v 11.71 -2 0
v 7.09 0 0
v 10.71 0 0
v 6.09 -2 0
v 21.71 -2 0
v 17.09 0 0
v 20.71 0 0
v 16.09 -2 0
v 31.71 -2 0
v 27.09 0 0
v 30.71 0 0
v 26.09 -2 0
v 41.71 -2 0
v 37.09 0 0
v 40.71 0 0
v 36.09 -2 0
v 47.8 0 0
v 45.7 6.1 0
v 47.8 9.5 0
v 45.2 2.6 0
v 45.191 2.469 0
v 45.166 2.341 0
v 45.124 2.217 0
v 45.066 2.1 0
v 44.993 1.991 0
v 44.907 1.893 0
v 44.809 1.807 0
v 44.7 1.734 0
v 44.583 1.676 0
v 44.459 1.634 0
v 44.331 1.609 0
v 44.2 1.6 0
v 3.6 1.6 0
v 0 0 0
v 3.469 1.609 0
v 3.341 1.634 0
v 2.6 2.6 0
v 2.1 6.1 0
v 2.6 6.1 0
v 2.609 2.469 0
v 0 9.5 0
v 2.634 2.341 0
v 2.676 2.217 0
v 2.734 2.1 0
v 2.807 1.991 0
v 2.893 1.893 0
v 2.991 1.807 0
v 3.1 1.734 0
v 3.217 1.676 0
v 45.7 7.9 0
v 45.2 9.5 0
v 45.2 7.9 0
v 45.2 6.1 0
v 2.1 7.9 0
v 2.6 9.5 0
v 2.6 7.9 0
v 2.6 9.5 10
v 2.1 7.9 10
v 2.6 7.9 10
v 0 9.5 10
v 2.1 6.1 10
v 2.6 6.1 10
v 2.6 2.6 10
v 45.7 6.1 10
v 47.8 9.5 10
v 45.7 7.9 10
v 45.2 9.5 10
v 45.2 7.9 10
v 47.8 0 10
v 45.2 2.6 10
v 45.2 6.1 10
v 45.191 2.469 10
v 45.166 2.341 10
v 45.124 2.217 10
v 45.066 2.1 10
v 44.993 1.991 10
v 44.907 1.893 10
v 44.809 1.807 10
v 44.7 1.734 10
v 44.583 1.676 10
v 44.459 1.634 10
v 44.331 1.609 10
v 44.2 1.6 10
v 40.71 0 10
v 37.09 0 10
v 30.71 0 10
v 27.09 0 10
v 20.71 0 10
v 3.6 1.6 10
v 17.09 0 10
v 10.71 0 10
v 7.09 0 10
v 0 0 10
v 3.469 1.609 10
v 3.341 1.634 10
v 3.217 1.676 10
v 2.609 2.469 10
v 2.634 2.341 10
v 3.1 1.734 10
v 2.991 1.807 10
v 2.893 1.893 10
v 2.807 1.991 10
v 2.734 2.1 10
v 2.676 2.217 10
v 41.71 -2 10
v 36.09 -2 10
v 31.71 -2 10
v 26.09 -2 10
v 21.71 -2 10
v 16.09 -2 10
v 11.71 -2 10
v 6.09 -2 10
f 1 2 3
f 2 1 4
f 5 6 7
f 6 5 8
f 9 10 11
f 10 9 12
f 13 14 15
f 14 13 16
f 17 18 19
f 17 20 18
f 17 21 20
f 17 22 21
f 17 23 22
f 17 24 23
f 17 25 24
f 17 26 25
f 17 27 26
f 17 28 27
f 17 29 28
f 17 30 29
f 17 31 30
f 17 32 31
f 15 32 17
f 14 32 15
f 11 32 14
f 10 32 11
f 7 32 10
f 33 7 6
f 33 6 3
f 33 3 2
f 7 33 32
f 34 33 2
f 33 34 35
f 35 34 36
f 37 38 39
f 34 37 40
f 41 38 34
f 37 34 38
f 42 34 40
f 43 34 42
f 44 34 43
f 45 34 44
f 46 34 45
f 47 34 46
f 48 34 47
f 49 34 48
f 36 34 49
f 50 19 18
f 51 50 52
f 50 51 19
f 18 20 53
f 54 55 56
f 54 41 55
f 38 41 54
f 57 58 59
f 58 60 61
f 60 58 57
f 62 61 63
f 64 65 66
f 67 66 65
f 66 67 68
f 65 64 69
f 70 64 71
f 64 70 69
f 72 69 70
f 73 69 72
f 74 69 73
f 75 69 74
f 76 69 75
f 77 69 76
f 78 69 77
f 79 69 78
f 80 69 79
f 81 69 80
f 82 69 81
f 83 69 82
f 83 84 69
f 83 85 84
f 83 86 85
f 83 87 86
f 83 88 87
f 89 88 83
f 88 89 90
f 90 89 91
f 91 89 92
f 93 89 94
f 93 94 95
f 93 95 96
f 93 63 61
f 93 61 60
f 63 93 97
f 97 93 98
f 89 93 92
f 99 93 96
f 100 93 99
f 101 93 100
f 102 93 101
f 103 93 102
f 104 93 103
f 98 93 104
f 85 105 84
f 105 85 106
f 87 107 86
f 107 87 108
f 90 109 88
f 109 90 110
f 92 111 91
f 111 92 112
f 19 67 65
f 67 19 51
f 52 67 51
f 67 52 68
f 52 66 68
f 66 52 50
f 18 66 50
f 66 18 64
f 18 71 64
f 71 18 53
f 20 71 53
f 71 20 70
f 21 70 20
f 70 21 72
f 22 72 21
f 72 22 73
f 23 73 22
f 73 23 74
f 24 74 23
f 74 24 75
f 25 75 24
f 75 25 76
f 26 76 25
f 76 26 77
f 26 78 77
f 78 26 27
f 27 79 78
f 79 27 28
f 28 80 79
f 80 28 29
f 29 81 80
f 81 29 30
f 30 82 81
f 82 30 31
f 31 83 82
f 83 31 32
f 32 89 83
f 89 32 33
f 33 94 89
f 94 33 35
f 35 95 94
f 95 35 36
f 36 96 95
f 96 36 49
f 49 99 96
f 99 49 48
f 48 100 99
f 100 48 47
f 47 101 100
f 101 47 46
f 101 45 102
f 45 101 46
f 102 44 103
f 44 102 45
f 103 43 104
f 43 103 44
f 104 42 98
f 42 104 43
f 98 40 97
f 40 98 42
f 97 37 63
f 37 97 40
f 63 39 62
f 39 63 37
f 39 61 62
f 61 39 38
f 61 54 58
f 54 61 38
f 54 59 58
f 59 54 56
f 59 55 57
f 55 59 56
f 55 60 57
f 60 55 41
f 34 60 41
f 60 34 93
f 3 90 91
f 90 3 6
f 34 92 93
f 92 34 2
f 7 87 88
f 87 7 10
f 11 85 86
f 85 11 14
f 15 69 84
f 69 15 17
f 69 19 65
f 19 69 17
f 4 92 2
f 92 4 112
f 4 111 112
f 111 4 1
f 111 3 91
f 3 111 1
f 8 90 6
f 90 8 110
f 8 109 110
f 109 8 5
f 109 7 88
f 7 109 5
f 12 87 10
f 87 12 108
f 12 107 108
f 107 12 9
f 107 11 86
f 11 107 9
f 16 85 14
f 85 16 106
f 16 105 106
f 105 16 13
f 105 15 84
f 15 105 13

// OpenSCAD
// fixture for PCB, Daypower step down module 2596-2
// 
// 
// Background:
//   - repository: https://github.com/Github6am/am_parts3D
//   - CAD manual: http://www.openscad.org/documentation.html
//   - product purchase
//     https://www.pollin.de/p/step-down-modul-mit-spannungsanzeige-daypower-power-2596-2-810585
//
// Andreas Merz 2019-08-20, v0.2 
// GPLv3 or later, see http://www.gnu.org/licenses


// import dovetail and mounting plate definitions
use <raspi_RJ45fix.scad>

// Main dimensions
bw=43.6;       // board width
dw=0.5;        // ridge depth to hold board
bt=1.8;        // board thickness
wall=1.6;      // wall thickness
fw=10;         // fixture width

//-------------------------------------------
// board fixure
//-------------------------------------------
module dovetailmounts(y1=0) {
     linear_extrude(height = fw) 
       union() {
         translate([-2*10+5, y1,0]) rotate(180) schwalbenschwanz();
         translate([-1*10+5, y1,0]) rotate(180) schwalbenschwanz();
         translate([-0*10+5, y1,0]) rotate(180) schwalbenschwanz();
         translate([ 1*10+5, y1,0]) rotate(180) schwalbenschwanz();
         //translate([ 2*10+5, y1,0]) rotate(180) schwalbenschwanz();
       }
}

module boardfixture() {
   h3=4.5;
   union() {
     linear_extrude(height = fw)
       difference() {
         union() {
           square([bw+2*wall+2*dw, h3+bt+2*wall]);
         }
         union() {
           minkowski() {
             translate([wall+2*dw+1, wall+1, 0]) square([bw-2*dw-2, h3+bt+2*wall]);
             circle(r=1,$fn=48);
           }
           translate([wall+dw   , h3+wall, 0]) square([bw, bt]);
         }
       }  
    translate([(bw+2*wall+2*dw)/2,0, 0]) dovetailmounts();
  }     
}



//------------- Instances --------------------

boardfixture();
